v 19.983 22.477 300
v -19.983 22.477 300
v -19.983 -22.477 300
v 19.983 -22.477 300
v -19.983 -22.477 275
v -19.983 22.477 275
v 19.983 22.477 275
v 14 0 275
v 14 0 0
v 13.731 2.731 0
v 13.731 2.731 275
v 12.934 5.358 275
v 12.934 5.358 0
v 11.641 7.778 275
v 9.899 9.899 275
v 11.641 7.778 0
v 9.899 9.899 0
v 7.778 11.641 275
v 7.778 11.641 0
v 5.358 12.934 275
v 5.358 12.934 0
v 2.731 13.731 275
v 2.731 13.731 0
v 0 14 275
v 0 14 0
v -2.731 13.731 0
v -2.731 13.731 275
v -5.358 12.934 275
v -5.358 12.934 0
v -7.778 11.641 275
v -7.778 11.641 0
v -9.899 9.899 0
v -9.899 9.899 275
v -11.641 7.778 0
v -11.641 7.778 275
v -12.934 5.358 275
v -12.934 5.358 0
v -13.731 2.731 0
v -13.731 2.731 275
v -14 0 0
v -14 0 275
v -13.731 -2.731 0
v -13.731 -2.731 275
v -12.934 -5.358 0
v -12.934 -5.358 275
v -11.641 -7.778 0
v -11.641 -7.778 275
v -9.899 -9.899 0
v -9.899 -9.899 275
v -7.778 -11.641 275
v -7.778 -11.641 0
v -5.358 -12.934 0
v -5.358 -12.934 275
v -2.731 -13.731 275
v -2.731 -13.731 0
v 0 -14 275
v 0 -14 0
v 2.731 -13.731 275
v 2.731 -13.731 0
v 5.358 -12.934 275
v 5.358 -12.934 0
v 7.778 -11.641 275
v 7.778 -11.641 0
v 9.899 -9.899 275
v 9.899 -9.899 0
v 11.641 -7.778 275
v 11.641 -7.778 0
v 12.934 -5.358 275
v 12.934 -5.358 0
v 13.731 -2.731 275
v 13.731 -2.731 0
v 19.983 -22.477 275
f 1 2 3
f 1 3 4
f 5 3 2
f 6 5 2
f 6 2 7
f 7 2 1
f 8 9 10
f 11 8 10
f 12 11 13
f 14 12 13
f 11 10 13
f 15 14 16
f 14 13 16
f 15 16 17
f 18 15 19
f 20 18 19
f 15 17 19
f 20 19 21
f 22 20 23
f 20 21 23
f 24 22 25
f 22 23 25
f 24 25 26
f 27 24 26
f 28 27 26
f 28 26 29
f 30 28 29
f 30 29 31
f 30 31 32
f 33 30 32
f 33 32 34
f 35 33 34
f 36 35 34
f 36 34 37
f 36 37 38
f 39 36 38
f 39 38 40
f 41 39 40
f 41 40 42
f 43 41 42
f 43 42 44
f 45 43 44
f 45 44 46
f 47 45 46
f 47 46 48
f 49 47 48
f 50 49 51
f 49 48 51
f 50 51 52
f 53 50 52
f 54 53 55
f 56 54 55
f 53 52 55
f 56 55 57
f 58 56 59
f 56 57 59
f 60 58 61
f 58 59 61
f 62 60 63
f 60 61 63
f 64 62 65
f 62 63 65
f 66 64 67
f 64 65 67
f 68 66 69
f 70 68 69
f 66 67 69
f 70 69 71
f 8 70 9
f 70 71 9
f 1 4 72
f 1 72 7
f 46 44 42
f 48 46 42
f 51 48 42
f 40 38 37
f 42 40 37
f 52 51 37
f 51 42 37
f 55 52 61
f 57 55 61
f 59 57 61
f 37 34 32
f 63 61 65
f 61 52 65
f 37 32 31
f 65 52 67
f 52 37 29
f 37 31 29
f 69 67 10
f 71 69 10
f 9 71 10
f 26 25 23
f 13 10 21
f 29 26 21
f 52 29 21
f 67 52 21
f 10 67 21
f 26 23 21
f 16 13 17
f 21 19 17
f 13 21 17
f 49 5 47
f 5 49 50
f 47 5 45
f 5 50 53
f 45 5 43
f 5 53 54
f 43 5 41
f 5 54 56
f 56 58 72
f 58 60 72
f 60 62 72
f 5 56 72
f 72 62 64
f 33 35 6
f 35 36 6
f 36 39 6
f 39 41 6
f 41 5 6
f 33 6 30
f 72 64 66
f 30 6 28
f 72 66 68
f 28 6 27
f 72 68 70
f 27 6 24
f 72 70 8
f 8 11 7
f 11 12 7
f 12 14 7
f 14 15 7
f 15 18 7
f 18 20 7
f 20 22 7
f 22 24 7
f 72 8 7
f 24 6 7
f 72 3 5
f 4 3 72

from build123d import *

# Parameters (mm, degrees)
F0_R     = 14
F1_DEPTH = 300
F2_W     = 39.96696
F2_H     = 44.953362
F2_R     = 14
F3_DEPTH = 25


with BuildPart() as f1:
    # F0 (on Top) → F1 (new body)
    with BuildSketch(Plane.XY):
        Circle(F0_R)
    extrude(amount=F1_DEPTH)

    # F2 (on face) → F3 (join)
    with BuildSketch(Plane.XY.offset(300)):
        Rectangle(F2_W, F2_H)
        Circle(F2_R, mode=Mode.SUBTRACT)
    extrude(amount=-F3_DEPTH)


solid = f1.part
